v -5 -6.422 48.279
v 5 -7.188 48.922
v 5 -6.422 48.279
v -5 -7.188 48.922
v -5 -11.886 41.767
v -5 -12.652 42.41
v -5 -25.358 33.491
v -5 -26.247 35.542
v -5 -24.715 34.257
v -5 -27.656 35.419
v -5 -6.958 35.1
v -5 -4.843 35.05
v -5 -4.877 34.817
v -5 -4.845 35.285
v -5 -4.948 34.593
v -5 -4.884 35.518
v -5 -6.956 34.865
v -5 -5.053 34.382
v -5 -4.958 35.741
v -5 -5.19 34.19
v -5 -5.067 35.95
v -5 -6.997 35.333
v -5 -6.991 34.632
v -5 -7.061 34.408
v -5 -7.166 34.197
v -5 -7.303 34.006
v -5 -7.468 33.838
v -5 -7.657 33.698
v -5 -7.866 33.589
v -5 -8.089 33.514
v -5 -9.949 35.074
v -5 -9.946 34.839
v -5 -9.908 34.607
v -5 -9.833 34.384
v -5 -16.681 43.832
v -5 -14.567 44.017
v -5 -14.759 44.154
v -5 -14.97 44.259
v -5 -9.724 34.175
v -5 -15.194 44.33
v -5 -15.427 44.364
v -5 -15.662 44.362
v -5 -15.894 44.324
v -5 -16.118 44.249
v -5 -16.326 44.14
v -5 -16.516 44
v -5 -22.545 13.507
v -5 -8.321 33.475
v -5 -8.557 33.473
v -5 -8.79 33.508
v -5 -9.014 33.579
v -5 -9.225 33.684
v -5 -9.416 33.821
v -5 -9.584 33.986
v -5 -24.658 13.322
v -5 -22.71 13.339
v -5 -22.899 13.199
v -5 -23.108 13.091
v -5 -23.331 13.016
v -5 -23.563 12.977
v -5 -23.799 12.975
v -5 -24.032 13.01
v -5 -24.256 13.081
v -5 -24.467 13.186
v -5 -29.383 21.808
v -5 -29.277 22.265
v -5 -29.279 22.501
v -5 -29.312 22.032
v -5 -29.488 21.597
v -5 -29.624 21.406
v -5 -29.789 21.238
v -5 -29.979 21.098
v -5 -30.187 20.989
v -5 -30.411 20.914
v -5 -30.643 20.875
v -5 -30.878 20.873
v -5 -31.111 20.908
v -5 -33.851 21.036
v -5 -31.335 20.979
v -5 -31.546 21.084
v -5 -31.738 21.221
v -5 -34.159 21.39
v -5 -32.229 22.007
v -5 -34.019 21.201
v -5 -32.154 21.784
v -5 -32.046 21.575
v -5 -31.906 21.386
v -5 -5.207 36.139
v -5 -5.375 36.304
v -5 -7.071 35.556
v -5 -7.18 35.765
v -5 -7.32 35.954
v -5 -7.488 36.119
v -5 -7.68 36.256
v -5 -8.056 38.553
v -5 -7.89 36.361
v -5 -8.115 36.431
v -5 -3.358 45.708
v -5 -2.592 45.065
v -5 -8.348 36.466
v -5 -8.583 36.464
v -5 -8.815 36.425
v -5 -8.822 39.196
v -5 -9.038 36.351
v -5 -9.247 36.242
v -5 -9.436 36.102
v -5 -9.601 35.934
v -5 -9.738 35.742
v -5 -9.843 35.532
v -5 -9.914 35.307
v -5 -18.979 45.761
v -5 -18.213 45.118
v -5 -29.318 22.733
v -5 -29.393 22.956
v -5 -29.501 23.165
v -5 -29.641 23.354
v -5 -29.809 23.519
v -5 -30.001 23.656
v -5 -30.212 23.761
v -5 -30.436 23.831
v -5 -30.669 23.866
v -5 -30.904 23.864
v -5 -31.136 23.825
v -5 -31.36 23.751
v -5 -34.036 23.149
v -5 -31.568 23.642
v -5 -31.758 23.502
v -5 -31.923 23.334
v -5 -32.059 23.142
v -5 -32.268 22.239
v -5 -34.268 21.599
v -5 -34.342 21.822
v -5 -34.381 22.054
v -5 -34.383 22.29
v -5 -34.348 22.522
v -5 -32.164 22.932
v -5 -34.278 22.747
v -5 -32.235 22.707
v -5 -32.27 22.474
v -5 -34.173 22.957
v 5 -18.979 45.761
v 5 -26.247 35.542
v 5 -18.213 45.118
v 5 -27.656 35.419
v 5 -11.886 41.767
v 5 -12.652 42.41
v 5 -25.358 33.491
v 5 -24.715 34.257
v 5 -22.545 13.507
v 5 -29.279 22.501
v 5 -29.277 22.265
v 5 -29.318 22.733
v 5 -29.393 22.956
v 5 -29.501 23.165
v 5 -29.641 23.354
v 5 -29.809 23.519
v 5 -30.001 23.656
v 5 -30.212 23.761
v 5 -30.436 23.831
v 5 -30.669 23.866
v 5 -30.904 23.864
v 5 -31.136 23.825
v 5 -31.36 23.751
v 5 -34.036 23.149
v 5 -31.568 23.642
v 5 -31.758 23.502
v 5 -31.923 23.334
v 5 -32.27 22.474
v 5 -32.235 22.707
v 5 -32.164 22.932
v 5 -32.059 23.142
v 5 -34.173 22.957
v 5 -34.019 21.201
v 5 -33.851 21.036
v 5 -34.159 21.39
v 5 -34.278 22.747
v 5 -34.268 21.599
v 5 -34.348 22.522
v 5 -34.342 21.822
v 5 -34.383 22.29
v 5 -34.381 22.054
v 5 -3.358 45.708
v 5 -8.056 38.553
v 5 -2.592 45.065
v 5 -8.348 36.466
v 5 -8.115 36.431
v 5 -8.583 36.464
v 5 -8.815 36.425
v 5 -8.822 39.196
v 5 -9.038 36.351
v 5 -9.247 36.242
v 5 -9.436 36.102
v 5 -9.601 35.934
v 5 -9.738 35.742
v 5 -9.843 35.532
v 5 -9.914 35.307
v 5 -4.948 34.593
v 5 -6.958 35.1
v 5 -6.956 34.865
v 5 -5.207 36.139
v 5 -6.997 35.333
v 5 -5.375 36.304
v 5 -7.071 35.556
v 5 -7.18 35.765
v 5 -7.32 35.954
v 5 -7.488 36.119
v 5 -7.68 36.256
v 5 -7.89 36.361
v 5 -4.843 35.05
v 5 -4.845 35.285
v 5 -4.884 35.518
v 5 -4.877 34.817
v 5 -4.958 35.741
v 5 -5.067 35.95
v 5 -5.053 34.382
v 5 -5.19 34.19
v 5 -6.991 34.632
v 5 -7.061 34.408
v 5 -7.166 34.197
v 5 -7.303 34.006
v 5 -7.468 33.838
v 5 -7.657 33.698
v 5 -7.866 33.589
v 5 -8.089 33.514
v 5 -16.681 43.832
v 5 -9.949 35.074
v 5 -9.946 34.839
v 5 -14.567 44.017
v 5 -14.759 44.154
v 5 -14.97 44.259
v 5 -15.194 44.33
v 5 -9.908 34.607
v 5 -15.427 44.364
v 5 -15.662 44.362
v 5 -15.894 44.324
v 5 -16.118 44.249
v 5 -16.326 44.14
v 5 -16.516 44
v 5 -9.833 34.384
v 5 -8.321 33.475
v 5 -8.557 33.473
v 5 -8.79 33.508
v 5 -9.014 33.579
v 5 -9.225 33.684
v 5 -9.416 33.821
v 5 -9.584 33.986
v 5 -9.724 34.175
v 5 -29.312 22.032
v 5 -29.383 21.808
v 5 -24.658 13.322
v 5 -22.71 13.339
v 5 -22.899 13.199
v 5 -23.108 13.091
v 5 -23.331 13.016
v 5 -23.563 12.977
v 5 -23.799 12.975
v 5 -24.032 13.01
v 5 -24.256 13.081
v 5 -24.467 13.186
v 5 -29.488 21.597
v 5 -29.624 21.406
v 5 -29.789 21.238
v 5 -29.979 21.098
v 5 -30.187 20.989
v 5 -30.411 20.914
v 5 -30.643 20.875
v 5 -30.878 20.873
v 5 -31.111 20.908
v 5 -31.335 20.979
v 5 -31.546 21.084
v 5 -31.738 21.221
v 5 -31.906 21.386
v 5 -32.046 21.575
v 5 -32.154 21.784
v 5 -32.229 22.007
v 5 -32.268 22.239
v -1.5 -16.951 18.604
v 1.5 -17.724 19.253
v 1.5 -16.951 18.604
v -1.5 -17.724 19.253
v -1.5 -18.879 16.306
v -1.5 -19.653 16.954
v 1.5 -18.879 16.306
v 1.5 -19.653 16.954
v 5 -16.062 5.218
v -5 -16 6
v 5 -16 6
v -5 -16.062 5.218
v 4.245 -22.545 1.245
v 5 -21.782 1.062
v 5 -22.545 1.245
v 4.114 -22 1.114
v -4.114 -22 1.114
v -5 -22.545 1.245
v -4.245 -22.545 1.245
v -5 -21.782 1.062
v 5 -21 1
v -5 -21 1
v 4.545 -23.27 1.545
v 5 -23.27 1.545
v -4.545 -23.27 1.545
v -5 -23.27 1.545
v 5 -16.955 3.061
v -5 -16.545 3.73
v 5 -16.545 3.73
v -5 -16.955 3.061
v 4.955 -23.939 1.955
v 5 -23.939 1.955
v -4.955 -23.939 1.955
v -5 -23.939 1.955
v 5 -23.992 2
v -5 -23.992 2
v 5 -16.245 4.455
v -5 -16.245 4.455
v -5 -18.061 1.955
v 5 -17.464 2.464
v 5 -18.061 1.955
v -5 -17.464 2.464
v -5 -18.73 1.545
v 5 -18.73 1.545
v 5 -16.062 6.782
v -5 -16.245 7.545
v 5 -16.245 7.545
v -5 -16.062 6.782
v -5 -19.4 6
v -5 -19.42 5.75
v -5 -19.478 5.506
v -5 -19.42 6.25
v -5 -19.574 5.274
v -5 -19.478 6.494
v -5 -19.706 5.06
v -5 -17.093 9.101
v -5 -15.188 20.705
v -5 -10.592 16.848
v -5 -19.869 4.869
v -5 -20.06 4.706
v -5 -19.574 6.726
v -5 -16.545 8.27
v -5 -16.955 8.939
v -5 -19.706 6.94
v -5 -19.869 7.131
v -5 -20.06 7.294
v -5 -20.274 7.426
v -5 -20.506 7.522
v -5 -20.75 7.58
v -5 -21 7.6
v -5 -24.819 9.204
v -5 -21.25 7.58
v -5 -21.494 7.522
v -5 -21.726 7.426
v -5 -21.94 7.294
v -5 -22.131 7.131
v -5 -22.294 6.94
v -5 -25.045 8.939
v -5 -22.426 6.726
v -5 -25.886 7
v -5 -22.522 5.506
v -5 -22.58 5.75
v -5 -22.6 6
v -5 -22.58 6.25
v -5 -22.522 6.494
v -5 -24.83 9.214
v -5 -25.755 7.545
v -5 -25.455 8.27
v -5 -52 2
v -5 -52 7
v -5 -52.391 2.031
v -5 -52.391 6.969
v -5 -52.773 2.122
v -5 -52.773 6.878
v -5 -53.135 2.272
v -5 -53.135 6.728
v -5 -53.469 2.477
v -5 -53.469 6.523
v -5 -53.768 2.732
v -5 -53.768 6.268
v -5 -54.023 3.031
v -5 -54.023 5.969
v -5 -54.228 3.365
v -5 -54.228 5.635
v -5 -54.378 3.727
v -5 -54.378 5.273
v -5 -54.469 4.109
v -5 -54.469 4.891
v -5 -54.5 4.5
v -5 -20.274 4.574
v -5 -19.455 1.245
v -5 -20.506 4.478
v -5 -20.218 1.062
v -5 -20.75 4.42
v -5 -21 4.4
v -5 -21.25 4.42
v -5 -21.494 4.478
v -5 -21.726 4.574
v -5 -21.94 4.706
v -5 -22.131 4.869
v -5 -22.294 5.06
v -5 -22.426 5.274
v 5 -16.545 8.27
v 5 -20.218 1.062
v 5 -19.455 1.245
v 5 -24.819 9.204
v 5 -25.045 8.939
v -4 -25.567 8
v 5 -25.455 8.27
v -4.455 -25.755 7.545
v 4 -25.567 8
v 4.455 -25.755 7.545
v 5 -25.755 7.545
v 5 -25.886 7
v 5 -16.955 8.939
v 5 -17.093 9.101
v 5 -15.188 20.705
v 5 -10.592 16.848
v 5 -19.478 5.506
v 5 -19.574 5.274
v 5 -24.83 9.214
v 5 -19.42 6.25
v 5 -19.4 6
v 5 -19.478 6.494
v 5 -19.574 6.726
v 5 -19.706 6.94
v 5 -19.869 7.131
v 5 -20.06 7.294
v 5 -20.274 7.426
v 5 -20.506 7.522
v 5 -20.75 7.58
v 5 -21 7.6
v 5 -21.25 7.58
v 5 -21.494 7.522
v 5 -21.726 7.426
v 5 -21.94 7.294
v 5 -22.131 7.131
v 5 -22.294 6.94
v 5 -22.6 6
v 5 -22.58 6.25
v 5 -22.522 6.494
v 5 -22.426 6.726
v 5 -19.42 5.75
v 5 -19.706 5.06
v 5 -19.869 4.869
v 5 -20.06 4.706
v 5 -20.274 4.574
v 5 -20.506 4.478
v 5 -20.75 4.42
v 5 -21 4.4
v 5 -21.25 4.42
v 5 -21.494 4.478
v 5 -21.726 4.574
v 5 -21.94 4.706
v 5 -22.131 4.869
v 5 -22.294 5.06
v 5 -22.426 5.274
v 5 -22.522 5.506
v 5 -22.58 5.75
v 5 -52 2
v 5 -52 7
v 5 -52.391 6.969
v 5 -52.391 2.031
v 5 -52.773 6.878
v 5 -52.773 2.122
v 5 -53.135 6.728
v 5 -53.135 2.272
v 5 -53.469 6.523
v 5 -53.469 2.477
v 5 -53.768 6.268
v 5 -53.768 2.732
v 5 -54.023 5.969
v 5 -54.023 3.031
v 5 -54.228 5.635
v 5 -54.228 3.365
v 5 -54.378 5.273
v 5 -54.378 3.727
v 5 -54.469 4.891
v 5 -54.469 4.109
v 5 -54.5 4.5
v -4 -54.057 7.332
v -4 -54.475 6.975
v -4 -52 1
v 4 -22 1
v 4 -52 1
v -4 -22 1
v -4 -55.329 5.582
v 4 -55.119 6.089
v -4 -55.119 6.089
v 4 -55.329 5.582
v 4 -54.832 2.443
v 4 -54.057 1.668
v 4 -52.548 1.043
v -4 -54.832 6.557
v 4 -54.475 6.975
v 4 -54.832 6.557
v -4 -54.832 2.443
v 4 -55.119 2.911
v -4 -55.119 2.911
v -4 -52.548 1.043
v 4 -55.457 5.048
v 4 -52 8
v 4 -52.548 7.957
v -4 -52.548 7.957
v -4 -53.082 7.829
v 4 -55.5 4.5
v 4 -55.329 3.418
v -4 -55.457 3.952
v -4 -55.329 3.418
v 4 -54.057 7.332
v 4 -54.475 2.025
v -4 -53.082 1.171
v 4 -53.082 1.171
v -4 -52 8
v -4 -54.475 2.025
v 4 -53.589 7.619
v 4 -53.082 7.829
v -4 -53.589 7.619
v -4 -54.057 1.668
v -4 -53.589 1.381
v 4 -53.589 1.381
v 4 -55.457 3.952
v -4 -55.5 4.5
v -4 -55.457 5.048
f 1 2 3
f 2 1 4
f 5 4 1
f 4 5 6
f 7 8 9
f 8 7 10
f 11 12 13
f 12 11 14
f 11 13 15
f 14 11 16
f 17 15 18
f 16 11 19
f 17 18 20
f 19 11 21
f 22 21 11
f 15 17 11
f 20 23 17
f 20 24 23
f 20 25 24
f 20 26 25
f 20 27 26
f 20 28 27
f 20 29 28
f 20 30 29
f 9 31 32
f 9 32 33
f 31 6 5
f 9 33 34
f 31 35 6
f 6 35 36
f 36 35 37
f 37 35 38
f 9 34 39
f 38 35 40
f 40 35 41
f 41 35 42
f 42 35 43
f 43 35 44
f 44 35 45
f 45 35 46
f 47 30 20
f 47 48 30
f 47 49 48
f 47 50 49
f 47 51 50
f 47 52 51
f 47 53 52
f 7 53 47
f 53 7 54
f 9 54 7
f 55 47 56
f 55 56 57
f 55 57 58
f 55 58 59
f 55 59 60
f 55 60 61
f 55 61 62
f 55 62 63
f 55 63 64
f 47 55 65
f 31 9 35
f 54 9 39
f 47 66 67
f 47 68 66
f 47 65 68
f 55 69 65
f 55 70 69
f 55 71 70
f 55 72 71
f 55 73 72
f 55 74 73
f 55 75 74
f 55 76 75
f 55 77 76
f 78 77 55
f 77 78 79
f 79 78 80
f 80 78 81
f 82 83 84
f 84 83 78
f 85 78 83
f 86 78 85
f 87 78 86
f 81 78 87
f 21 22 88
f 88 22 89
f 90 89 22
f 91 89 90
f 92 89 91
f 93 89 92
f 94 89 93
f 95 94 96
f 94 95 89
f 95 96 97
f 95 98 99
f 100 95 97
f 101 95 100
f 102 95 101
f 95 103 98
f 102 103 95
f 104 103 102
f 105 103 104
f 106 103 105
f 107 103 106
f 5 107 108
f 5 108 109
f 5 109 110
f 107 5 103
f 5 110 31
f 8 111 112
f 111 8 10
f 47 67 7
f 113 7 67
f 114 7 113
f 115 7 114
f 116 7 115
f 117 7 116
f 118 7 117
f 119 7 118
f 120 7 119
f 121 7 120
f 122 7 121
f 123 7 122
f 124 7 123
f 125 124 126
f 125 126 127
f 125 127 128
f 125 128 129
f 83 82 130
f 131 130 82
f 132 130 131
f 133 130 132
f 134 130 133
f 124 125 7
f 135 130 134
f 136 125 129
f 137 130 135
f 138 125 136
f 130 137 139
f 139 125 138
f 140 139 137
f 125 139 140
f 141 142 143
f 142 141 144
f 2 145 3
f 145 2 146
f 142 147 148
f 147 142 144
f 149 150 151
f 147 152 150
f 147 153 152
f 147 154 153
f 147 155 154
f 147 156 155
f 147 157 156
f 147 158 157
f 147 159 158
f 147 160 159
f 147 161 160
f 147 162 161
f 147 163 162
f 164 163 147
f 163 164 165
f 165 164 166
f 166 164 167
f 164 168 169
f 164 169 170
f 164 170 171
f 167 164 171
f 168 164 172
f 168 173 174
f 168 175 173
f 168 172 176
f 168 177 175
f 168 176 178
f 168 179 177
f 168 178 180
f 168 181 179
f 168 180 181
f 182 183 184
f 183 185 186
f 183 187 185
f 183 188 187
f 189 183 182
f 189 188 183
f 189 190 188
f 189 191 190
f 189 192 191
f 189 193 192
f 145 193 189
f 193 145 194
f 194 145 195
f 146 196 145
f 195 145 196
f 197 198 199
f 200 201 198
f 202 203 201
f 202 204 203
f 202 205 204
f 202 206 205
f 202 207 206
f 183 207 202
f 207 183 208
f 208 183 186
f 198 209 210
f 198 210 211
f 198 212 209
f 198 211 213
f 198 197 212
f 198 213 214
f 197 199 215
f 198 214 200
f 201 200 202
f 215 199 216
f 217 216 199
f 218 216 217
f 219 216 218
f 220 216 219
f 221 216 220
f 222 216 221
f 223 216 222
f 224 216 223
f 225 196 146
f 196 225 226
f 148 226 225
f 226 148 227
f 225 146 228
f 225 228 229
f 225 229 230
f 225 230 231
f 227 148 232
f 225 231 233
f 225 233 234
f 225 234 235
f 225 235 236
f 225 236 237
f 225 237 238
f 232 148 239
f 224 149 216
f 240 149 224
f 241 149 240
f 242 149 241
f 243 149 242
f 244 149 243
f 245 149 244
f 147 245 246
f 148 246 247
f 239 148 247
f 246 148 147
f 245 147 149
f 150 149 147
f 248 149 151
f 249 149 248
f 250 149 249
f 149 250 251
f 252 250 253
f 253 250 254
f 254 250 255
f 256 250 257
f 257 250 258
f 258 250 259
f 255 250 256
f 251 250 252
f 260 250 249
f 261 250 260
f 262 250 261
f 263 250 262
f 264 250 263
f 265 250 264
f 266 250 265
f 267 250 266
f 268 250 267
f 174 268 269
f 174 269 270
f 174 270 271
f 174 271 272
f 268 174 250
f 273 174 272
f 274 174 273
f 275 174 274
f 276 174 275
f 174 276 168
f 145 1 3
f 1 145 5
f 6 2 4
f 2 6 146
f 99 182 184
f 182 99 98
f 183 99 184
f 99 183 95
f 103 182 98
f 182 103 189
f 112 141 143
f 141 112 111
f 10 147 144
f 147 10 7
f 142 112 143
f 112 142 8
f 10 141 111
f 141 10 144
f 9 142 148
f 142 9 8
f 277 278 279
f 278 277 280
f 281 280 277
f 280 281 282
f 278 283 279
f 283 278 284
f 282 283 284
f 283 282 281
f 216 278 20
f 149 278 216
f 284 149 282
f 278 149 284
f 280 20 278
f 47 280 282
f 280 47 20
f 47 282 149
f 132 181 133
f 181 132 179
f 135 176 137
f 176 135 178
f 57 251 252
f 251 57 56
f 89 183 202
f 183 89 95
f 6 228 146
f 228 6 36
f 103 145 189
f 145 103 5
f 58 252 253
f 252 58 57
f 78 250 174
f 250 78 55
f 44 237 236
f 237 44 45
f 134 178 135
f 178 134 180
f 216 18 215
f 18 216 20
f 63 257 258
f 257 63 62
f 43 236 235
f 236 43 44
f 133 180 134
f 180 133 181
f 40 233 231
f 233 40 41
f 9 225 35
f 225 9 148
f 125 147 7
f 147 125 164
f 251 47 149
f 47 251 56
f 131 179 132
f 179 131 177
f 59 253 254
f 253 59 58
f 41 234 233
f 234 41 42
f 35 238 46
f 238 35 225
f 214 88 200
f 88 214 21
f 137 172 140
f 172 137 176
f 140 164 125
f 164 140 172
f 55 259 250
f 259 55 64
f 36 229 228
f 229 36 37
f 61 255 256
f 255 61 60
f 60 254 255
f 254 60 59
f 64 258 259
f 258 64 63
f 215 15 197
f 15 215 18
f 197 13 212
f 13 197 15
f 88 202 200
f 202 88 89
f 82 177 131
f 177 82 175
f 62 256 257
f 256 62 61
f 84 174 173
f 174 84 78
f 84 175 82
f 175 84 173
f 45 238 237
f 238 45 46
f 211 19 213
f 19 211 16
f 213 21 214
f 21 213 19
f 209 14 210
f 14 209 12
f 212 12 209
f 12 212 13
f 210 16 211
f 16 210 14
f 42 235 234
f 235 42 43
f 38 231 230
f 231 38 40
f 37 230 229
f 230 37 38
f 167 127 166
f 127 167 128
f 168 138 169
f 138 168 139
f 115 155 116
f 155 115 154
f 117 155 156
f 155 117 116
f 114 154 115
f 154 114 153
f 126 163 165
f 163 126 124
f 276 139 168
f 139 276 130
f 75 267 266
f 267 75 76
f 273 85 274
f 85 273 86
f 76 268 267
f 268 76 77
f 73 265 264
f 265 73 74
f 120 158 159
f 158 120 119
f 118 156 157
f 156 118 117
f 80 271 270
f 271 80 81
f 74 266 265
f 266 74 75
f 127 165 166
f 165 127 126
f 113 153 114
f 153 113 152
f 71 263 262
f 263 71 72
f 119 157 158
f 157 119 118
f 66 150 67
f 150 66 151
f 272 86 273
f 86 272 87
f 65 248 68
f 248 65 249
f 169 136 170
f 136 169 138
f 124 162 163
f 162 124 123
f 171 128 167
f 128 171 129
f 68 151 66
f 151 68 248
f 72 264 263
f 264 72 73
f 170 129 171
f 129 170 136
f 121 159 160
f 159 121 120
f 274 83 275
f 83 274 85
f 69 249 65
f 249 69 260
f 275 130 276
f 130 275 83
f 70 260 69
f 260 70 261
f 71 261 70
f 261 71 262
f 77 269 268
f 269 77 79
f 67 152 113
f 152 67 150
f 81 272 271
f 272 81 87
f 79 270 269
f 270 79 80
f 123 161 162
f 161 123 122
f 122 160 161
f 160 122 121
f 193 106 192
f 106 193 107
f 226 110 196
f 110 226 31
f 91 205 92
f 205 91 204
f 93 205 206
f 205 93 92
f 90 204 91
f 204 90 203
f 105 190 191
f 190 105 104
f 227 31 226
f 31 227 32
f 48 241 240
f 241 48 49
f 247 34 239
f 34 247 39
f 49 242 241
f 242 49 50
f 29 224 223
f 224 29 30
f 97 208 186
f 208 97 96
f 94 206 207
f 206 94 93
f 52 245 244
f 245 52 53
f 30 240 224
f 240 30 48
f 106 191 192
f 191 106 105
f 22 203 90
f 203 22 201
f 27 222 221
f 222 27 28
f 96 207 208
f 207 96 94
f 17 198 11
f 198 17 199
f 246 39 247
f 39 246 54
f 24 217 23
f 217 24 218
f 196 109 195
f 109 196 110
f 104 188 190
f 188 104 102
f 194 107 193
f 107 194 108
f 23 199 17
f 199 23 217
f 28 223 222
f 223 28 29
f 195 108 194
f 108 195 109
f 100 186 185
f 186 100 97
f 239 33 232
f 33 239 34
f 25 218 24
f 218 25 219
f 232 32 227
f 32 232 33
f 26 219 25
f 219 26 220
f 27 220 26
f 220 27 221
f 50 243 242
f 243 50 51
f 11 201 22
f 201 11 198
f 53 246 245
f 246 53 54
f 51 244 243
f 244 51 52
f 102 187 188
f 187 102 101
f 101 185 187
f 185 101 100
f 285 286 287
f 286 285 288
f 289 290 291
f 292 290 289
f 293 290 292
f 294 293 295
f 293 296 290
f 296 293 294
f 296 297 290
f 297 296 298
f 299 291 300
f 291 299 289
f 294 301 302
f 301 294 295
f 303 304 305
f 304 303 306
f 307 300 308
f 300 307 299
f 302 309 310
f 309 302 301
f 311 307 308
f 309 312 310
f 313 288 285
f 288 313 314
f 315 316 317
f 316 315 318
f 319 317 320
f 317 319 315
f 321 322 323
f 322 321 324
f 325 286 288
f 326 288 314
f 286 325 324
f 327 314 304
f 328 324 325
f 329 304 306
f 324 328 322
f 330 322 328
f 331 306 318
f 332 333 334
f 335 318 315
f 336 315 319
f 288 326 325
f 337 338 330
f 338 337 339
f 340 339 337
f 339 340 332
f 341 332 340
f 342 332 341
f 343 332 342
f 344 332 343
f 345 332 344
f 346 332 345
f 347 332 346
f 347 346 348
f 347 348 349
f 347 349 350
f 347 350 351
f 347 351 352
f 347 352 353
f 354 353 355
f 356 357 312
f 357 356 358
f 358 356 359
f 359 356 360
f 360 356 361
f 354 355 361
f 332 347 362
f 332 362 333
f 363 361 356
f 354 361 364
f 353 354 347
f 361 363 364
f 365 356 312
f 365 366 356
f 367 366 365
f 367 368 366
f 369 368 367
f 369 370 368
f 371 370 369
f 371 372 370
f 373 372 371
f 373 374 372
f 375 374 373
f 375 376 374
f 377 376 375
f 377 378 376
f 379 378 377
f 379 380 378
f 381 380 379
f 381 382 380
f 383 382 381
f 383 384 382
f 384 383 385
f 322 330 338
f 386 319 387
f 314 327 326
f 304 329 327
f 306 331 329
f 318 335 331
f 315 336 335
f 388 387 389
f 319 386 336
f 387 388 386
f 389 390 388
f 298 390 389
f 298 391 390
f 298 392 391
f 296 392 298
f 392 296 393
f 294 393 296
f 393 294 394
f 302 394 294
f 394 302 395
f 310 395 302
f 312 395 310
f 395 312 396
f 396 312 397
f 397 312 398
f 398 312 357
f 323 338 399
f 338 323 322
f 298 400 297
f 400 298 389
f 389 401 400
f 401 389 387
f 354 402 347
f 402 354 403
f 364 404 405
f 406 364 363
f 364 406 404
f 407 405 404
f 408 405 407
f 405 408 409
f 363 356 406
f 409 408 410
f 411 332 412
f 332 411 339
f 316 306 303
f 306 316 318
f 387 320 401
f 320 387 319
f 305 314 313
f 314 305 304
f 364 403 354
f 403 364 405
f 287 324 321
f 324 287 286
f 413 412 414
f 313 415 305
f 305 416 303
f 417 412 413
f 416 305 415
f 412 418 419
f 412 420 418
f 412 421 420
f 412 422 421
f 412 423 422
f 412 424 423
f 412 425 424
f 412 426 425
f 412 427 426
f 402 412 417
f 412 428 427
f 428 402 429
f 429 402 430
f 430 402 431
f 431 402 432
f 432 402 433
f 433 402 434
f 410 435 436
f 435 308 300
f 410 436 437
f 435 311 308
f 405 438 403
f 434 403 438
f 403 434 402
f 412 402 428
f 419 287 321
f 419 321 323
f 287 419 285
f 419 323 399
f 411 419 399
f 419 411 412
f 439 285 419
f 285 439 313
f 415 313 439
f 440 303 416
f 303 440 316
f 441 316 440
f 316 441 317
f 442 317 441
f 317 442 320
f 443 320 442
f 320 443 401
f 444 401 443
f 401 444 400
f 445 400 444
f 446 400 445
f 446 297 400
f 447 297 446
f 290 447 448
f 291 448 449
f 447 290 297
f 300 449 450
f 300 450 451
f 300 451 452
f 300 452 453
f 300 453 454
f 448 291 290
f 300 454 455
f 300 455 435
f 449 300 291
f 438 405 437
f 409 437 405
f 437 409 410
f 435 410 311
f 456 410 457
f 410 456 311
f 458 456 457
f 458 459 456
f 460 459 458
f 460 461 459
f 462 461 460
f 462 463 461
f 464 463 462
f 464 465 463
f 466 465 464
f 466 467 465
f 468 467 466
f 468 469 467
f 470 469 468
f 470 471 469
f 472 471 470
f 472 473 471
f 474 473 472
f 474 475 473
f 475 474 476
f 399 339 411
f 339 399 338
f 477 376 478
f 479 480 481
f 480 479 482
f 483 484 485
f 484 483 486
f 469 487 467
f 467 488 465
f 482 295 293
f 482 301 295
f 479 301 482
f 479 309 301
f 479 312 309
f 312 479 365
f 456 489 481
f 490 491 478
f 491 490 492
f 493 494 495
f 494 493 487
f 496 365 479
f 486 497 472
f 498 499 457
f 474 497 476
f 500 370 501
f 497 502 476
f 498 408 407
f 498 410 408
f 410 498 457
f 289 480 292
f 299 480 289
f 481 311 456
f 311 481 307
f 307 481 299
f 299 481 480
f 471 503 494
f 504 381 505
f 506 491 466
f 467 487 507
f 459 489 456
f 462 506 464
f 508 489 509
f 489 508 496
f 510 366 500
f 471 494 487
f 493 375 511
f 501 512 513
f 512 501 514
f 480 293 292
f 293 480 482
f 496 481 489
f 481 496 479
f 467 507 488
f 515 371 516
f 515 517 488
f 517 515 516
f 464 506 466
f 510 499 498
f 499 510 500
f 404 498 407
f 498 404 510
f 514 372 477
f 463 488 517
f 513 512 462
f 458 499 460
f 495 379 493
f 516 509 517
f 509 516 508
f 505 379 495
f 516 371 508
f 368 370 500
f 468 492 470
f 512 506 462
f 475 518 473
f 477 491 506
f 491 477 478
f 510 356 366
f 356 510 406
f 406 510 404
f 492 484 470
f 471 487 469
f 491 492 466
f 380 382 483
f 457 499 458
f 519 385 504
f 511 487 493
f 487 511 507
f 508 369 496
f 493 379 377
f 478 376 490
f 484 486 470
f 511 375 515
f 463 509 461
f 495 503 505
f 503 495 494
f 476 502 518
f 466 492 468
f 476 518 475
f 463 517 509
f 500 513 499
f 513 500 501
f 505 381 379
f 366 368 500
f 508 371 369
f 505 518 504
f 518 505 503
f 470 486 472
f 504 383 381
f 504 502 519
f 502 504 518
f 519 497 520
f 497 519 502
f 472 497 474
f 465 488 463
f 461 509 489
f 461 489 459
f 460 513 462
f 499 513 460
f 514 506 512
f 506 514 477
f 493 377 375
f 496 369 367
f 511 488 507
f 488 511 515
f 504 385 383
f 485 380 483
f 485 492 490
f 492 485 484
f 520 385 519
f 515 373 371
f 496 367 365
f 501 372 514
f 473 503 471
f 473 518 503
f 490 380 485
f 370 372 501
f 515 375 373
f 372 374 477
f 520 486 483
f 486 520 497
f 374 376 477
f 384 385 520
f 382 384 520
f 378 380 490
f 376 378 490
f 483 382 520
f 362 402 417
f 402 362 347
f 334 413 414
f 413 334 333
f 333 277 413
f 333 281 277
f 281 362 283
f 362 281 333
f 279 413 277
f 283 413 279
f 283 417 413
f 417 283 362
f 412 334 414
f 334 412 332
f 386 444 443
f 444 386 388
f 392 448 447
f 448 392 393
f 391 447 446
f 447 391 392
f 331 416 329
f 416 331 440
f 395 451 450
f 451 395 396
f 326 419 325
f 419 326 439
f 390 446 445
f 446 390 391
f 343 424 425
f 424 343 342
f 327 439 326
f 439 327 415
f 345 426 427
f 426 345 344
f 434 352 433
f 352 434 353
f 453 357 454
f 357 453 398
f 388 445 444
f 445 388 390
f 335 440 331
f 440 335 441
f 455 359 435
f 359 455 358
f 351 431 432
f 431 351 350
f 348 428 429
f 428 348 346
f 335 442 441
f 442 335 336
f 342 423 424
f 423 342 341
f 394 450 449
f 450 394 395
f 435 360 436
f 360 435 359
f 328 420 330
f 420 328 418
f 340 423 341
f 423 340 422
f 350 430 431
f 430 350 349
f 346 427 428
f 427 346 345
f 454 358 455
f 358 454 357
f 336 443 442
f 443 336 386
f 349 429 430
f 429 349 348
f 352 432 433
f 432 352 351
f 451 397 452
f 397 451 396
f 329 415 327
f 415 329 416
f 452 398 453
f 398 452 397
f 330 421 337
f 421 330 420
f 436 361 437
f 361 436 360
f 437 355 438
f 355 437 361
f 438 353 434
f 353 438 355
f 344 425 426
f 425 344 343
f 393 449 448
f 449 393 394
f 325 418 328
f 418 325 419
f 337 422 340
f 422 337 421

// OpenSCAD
$fn=40;

// % translate([0,-12.5,0]) import("./stryfe-bolter-grip2.stl");

if (0) {
   % translate([-11.5,0,0]) {
      rotate([00,90,90]) import("./Nerf_Stryfe_Foregrip/files//StryfeForeGripMK2-Plate.stl");
      rotate([0,90,90]) import("./Nerf_Stryfe_Foregrip/files//StryfeForeGripMK2.stl");
   }
}

translate([0,-35,22]) rotate([-40,0,0]) rotate([0,-90,0]) switch();

if (0) difference() {
   exterior();
   translate([0,0,-0.01]) cutout();
}

translate([0,-21,6]) rotate([0,90,180]) trigger();

module trigger() {
   translate([0,0,-5]) difference() {
      union() { 
         cylinder(r=5,h=10);

         translate([-1,1,0]) hull() {
            cube([5,30,10]);
            translate([2.5,30,0]) cylinder(d=5,h=10);
            translate([-1,0,1]) cube([7,30,8]);
            translate([2.5,30,1]) cylinder(d=7,h=8);
         }

        rotate([0,0,40]) translate([-15,-1,0]) cube([15,6,10]);
      }

      translate([0,0,-.1]) cylinder(r=1.6,h=11);
   }
}

module switch(cutout=1) {
   translate([0,0,-5]) color("red") difference() {
      union() {
         translate([27,4,0]) cube([11.5,1,10]);
         translate([27,9,0]) cube([11.5,1,10]);
         translate([15,-3,0]) cube([13.5,1,10]);
         translate([15,-3,0]) cube([1,4,10]);
         translate([6,15,3.5]) cube([3,3,3]);
         hull() {
            translate([1.5,13.5,0]) cylinder(r=1.5,h=10);
            translate([1.5,1.5,0]) cylinder(r=1.5,h=10);
            translate([28.5,13.5,0]) cylinder(r=1.5,h=10);
            translate([28.5,1.5,0]) cylinder(r=1.5,h=10);
         }
      }
      if (cutout) {
         translate([3.0,3.0,-0.1]) cylinder(d=3,h=11);
         translate([27,12,-0.1]) cylinder(d=3,h=11);
      }
   }
}

/* dimensions
 * 18.6mm outside of rail
 * 13.49 between edges going into rail
 * 3.07 thick piece going into rail
 * 3.27 under the rail clearance
 */


/* interior volume to cut out */
module cutout() {
   translate([-13.49/2,-38+6.34,0]) cube([13.49, 38, 82-13.49/2]);
   translate([0,6.34,82-13.49/2]) rotate([90,0,0]) cylinder(h=38,r=13.49/2);
   translate([-13.49/2,+6.34-4,0]) cube([13.49, 4, 82]);
   translate([-18.6/2,-38+6.34,0]) cube([18.6, 38, 27.5]);
   translate([-18.6/2,0,0]) cube([18.6, 3.27, 82]);
}

module exterior() {
   for (i=[0:5]) {
      translate([0,0,15.5*i]) grip(len=45,width=30);
   }
   translate([0,0,0]) grip(len=44,width=27,ht=85);
   translate([-27/2,-40+6.33,0]) cube([27,40,85]);
}

module grip(len=50,width=30,ht=6) {
   $fn=40;
   if (1) {
      linear_extrude(height=ht) translate([0,2-(len-8)/2+0.3,0]) minkowski() {
         square([(width-8),(len-8)],center=true);
         circle(r=4);
      }
   } else {
      /* bad idea */
      minkowski() {
         translate([0,2-(len-8)/2+0.3,0]) cube([width-8,len-8,1],center=true);
         sphere(r=4);
      }
   }
}
